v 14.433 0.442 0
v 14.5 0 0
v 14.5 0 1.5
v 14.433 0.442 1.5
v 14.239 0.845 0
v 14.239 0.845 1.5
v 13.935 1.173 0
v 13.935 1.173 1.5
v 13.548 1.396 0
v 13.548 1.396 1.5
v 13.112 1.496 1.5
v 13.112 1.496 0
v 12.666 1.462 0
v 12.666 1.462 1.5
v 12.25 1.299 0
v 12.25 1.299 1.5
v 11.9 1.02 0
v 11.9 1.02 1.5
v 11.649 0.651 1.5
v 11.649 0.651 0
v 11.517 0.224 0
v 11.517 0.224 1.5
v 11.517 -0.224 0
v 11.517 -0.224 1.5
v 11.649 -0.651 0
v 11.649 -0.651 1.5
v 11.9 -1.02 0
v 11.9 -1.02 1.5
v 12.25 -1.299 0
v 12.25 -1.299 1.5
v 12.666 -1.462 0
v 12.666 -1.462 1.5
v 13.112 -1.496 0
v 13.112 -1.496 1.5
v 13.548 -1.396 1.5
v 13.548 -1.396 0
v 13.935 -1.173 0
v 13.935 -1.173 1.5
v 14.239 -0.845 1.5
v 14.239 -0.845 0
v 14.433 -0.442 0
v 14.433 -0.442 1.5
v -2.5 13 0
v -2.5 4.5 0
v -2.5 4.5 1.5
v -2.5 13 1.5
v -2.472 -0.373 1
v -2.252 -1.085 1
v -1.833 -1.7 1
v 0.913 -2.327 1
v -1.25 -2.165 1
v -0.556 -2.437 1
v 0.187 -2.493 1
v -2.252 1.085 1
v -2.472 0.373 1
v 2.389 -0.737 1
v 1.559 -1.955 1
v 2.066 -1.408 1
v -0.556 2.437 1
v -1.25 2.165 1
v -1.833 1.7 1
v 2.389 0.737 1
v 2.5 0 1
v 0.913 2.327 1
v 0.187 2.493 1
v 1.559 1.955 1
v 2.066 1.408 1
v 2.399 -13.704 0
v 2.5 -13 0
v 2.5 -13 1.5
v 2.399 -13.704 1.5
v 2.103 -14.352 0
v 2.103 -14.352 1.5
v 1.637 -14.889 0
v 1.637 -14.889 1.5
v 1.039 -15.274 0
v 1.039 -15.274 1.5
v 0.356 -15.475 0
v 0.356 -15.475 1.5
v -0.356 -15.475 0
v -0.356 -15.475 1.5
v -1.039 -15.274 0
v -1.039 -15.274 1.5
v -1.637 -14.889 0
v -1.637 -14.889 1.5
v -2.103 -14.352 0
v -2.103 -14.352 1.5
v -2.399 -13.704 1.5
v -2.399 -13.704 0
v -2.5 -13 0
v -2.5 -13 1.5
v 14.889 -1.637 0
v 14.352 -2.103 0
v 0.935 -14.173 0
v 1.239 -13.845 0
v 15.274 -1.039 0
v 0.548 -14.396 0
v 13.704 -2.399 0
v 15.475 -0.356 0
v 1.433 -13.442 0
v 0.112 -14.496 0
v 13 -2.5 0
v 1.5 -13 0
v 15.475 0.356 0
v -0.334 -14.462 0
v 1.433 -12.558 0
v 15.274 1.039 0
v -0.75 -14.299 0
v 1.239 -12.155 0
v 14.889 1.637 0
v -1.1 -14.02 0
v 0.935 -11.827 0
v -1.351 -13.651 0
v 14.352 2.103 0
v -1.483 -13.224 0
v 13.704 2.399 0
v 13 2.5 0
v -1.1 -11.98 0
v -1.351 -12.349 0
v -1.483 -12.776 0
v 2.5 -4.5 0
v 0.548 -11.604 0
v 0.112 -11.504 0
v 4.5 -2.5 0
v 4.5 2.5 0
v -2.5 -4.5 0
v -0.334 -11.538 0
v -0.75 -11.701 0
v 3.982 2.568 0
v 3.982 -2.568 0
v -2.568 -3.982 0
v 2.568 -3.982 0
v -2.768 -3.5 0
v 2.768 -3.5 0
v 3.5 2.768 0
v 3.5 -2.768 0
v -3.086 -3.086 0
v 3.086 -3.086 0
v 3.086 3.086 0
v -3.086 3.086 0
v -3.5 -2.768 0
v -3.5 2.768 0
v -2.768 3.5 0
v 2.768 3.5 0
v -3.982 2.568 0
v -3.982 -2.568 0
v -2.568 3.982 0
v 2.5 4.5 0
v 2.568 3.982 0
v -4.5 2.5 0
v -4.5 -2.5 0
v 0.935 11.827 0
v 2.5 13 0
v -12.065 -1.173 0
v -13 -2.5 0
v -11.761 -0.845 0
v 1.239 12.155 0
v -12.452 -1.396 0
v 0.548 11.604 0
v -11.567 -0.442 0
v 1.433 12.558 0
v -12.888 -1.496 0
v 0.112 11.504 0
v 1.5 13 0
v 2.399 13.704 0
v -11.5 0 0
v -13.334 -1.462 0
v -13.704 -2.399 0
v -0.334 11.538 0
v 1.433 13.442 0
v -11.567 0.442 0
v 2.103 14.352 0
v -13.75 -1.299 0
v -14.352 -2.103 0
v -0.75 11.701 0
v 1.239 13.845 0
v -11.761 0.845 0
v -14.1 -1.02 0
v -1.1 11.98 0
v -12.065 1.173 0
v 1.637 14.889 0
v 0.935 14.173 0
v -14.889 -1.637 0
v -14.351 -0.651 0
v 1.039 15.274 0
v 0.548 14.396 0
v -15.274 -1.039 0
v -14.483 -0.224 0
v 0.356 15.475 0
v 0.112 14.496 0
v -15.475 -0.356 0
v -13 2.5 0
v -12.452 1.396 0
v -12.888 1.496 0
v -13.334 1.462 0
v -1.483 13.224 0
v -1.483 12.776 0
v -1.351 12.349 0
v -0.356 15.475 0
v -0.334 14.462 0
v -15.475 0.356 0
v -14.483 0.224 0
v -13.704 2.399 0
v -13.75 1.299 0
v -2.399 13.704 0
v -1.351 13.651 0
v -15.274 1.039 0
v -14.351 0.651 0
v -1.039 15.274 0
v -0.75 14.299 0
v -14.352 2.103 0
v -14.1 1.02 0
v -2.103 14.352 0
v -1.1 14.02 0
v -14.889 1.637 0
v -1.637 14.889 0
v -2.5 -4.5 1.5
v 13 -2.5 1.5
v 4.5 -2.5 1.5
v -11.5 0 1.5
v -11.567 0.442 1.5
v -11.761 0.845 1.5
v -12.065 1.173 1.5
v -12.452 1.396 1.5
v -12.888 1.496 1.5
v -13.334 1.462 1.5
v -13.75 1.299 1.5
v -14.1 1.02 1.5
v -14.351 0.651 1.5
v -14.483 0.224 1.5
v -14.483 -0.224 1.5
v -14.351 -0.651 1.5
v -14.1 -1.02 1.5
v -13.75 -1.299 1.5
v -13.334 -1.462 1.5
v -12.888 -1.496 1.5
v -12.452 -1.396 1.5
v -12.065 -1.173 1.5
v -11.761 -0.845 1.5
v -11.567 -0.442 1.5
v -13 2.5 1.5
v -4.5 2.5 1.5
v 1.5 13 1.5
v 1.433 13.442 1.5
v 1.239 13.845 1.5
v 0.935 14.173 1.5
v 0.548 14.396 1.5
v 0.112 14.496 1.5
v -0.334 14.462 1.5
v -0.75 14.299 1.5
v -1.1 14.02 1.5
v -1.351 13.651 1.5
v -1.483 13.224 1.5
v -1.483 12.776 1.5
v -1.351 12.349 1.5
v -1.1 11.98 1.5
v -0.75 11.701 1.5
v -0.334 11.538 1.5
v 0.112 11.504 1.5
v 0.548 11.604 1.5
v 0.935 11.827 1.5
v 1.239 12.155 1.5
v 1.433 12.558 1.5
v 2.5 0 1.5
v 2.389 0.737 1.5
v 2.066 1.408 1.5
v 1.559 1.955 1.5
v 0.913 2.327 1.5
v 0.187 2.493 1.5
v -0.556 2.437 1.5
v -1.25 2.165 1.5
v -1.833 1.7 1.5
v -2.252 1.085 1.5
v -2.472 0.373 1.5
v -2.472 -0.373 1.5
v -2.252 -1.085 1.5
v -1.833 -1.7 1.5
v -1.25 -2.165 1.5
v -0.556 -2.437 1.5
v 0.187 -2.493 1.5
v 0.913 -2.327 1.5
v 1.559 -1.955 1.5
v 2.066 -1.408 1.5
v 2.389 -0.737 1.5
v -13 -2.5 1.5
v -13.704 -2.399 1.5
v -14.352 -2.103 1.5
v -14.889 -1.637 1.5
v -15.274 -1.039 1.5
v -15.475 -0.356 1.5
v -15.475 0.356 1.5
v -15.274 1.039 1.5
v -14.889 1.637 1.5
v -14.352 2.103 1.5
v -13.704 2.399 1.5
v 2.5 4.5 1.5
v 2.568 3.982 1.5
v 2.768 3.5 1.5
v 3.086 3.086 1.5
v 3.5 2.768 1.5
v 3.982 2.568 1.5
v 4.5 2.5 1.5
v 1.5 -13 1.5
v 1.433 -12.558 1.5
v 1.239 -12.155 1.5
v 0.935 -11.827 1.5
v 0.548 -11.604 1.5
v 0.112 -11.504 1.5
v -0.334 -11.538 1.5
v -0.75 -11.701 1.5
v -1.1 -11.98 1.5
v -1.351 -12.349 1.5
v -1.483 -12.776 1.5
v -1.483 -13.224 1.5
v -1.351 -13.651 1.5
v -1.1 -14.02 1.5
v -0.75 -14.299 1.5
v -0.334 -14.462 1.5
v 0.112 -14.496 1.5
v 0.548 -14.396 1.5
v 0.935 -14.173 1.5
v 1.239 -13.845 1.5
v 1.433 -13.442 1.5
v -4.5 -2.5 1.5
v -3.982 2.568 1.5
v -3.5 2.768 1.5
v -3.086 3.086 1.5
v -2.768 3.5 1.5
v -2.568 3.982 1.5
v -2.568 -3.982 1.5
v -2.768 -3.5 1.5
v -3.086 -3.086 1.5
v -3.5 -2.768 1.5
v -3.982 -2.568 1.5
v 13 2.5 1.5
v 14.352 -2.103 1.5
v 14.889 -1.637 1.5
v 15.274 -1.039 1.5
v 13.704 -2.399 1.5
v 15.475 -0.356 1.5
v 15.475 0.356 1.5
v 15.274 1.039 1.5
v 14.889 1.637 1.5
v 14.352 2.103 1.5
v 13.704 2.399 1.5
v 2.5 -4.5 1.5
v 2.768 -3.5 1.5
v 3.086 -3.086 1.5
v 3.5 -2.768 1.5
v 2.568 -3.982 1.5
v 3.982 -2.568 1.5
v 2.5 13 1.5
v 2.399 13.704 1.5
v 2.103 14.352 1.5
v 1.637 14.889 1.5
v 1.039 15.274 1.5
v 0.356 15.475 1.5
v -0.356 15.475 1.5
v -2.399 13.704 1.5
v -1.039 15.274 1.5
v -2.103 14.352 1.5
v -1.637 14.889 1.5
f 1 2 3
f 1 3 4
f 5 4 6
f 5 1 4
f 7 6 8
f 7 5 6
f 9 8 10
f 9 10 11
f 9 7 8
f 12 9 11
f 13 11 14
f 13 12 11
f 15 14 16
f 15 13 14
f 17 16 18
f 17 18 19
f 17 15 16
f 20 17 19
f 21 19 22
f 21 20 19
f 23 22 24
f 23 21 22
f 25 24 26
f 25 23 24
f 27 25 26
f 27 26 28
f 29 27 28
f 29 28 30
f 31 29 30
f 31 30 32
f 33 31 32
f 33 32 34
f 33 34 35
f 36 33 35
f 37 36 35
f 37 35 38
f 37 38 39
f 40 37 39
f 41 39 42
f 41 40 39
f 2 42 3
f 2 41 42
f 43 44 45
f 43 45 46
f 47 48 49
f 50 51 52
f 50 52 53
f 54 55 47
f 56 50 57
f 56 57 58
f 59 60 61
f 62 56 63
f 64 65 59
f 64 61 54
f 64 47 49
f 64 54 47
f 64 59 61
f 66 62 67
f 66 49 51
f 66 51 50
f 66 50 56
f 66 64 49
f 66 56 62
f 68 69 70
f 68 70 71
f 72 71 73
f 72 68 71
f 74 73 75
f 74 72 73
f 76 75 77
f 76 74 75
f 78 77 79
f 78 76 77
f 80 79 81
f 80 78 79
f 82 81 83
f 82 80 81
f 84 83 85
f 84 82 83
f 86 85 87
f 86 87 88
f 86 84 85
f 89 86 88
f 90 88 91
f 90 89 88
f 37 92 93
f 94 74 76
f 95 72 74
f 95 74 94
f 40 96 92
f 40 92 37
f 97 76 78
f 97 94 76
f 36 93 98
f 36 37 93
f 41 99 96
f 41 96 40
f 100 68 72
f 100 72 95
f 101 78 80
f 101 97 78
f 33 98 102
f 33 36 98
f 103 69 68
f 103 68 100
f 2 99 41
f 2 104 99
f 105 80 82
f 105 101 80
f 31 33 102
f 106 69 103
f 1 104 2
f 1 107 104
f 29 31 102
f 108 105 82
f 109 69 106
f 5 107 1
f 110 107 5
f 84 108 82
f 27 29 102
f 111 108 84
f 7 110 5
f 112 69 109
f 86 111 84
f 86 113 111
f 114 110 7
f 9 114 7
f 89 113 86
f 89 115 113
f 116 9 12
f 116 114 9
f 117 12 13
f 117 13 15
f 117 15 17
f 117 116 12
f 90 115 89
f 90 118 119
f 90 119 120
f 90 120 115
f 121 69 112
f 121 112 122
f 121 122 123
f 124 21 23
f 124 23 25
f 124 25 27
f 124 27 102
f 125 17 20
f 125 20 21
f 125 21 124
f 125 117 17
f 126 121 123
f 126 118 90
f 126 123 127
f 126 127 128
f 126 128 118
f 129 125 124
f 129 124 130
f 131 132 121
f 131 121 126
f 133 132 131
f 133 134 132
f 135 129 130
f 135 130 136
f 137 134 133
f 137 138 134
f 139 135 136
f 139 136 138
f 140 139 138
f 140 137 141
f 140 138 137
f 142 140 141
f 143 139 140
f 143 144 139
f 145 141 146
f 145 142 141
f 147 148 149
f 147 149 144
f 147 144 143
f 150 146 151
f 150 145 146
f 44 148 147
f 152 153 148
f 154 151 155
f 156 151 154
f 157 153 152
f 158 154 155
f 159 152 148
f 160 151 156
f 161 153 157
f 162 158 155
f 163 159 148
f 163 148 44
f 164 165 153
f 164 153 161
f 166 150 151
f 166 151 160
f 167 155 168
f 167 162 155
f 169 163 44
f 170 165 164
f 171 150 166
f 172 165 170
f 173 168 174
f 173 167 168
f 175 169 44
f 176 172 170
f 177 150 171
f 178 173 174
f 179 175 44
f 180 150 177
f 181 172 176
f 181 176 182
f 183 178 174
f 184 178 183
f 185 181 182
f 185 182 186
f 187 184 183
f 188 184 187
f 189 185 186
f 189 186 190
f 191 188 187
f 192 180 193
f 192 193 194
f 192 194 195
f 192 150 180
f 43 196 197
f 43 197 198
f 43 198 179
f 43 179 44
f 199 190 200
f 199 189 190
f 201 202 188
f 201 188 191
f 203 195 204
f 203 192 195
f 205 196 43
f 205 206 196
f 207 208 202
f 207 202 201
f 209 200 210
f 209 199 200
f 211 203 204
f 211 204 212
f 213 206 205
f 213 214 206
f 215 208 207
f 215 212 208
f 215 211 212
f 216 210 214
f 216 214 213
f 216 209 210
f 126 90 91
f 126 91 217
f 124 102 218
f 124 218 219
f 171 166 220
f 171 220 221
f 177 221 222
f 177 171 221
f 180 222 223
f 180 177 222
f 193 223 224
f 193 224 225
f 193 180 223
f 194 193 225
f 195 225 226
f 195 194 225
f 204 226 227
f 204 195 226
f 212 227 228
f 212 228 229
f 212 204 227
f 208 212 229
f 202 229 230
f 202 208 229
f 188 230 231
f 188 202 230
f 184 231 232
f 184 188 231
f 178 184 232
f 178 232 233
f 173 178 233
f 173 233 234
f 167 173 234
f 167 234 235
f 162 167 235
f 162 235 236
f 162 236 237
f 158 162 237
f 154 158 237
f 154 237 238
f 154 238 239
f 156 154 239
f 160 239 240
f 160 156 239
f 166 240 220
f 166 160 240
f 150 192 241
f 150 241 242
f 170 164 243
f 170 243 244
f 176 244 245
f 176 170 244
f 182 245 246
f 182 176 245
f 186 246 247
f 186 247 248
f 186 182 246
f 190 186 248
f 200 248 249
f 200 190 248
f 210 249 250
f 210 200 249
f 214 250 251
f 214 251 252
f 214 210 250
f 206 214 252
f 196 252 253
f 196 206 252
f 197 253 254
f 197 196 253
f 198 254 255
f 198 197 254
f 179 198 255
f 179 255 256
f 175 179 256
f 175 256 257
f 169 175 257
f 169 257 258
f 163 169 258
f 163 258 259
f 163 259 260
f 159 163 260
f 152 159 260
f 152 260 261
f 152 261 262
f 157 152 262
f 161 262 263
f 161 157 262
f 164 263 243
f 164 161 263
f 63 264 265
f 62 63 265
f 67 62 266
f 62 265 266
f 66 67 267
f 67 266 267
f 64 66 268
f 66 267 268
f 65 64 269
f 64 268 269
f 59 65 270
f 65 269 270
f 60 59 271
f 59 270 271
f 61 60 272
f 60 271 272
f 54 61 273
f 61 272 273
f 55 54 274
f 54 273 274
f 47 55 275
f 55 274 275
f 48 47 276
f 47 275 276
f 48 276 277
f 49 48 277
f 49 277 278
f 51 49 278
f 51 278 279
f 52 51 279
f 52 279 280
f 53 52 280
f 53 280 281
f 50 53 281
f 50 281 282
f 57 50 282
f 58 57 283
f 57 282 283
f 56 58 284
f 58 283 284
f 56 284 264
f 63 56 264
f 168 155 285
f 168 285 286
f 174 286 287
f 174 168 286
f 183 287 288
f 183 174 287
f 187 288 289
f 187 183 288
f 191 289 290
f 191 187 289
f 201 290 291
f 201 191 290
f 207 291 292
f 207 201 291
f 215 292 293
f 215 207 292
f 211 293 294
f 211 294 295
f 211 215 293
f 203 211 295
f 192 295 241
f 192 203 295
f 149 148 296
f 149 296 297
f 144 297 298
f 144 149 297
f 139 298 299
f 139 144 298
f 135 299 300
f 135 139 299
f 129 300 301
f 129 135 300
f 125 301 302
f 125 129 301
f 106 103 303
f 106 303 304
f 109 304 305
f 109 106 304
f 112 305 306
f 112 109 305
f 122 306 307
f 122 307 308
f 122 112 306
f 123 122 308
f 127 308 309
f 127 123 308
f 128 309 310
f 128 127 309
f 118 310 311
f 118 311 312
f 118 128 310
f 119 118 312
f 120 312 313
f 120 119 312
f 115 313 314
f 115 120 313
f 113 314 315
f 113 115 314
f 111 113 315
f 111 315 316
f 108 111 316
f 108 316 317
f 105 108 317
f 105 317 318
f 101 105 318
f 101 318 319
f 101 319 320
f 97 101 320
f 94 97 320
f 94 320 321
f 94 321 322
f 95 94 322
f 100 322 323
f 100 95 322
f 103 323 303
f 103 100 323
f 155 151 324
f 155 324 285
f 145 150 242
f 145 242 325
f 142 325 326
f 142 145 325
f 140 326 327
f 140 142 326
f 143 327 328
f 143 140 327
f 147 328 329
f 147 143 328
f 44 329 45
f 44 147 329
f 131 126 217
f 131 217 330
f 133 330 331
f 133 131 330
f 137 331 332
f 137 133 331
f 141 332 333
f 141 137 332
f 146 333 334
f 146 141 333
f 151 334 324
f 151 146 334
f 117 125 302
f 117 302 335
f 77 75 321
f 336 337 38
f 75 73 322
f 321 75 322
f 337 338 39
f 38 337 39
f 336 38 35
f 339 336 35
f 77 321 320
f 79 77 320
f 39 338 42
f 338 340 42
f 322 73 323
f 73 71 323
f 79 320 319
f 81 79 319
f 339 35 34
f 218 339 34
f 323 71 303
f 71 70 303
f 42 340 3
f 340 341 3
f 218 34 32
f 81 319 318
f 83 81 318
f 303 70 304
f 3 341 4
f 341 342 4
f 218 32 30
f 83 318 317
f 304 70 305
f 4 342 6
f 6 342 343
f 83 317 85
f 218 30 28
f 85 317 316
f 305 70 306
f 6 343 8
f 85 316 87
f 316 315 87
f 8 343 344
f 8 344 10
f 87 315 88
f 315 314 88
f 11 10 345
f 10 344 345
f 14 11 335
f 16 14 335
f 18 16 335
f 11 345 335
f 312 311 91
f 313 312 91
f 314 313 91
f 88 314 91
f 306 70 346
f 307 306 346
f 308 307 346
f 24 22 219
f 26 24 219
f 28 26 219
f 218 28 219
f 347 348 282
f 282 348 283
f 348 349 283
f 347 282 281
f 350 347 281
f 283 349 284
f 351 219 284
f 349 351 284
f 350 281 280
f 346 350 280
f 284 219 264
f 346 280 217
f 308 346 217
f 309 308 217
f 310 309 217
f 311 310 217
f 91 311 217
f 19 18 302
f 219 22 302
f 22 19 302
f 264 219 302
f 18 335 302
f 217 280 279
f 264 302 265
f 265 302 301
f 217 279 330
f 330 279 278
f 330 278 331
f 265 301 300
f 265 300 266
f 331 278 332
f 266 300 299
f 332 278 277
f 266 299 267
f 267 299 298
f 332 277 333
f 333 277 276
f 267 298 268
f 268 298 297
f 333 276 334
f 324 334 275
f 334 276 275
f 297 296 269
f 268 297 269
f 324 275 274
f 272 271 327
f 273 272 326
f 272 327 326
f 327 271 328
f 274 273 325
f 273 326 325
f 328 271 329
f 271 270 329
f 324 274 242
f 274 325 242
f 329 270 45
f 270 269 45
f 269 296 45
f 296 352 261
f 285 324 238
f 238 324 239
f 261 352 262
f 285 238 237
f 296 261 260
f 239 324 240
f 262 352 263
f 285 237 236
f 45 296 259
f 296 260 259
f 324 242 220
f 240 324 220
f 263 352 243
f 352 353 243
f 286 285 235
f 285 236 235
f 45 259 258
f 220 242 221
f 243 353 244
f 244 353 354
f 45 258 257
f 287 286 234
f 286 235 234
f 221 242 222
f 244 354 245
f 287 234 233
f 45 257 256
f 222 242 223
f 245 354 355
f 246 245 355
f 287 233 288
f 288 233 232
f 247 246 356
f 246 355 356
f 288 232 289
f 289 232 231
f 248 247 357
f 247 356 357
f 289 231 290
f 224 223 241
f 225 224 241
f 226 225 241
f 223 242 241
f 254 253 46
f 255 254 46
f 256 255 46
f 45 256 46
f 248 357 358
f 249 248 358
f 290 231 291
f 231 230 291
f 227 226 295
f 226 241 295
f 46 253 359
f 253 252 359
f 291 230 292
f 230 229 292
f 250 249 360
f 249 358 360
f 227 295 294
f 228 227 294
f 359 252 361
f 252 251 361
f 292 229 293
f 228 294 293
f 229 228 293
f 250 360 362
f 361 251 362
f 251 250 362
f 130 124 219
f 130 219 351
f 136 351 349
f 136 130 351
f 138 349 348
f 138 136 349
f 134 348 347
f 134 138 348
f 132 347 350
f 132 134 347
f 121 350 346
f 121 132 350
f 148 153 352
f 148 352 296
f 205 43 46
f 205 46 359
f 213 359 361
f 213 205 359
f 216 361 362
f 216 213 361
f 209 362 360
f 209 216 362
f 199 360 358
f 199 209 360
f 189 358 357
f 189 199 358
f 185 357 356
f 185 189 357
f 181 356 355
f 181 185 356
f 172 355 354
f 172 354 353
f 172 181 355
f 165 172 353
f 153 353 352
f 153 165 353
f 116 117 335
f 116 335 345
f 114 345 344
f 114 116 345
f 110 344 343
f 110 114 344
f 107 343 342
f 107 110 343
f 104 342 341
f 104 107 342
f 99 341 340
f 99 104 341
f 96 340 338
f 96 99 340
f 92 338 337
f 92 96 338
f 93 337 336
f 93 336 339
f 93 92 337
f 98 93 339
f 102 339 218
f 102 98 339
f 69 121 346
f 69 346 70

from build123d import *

# Parameters (mm, degrees)
IZIM1_R                     = 1.5
Y_KSEKLIK_EKSTR_ZYON1_DEPTH = 1.5
IZIM2_R                     = 2.5
KES_EKSTR_ZYON1_DEPTH       = 0.5


with BuildPart() as part:
    # Çizim1 → Yükseklik-Ekstrüzyon1 (new body)
    with BuildSketch(Plane.XY):
        with BuildLine():
            Line((-2.5, -13), (-2.5, -4.5))
            ThreePointArc((-2.5, -4.5), (-3.085786438, -3.085786438), (-4.5, -2.5))
            Line((-4.5, -2.5), (-13, -2.5))
            ThreePointArc((-13, -2.5), (-15.5, 0), (-13, 2.5))
            Line((-13, 2.5), (-4.5, 2.5))
            ThreePointArc((-4.5, 2.5), (-3.085786438, 3.085786438), (-2.5, 4.5))
            Line((-2.5, 4.5), (-2.5, 13))
            ThreePointArc((-2.5, 13), (0, 15.5), (2.5, 13))
            Line((2.5, 13), (2.5, 4.5))
            ThreePointArc((2.5, 4.5), (3.085786438, 3.085786438), (4.5, 2.5))
            Line((4.5, 2.5), (13, 2.5))
            ThreePointArc((13, 2.5), (15.5, 0), (13, -2.5))
            Line((13, -2.5), (4.5, -2.5))
            ThreePointArc((4.5, -2.5), (3.085786438, -3.085786438), (2.5, -4.5))
            Line((2.5, -4.5), (2.5, -13))
            ThreePointArc((2.5, -13), (0, -15.5), (-2.5, -13))
        make_face()
        with Locations((0, 13)):
            Circle(IZIM1_R, mode=Mode.SUBTRACT)
        with Locations((13, 0)):
            Circle(IZIM1_R, mode=Mode.SUBTRACT)
        with Locations((0, -13)):
            Circle(IZIM1_R, mode=Mode.SUBTRACT)
        with Locations((-13, 0)):
            Circle(IZIM1_R, mode=Mode.SUBTRACT)
    extrude(amount=Y_KSEKLIK_EKSTR_ZYON1_DEPTH)

    # Çizim2 → Kes-Ekstrüzyon1 (cut)
    with BuildSketch(Plane.XY.offset(1.5)):
        Circle(IZIM2_R)
    extrude(amount=-KES_EKSTR_ZYON1_DEPTH, mode=Mode.SUBTRACT)


solid = part.part
